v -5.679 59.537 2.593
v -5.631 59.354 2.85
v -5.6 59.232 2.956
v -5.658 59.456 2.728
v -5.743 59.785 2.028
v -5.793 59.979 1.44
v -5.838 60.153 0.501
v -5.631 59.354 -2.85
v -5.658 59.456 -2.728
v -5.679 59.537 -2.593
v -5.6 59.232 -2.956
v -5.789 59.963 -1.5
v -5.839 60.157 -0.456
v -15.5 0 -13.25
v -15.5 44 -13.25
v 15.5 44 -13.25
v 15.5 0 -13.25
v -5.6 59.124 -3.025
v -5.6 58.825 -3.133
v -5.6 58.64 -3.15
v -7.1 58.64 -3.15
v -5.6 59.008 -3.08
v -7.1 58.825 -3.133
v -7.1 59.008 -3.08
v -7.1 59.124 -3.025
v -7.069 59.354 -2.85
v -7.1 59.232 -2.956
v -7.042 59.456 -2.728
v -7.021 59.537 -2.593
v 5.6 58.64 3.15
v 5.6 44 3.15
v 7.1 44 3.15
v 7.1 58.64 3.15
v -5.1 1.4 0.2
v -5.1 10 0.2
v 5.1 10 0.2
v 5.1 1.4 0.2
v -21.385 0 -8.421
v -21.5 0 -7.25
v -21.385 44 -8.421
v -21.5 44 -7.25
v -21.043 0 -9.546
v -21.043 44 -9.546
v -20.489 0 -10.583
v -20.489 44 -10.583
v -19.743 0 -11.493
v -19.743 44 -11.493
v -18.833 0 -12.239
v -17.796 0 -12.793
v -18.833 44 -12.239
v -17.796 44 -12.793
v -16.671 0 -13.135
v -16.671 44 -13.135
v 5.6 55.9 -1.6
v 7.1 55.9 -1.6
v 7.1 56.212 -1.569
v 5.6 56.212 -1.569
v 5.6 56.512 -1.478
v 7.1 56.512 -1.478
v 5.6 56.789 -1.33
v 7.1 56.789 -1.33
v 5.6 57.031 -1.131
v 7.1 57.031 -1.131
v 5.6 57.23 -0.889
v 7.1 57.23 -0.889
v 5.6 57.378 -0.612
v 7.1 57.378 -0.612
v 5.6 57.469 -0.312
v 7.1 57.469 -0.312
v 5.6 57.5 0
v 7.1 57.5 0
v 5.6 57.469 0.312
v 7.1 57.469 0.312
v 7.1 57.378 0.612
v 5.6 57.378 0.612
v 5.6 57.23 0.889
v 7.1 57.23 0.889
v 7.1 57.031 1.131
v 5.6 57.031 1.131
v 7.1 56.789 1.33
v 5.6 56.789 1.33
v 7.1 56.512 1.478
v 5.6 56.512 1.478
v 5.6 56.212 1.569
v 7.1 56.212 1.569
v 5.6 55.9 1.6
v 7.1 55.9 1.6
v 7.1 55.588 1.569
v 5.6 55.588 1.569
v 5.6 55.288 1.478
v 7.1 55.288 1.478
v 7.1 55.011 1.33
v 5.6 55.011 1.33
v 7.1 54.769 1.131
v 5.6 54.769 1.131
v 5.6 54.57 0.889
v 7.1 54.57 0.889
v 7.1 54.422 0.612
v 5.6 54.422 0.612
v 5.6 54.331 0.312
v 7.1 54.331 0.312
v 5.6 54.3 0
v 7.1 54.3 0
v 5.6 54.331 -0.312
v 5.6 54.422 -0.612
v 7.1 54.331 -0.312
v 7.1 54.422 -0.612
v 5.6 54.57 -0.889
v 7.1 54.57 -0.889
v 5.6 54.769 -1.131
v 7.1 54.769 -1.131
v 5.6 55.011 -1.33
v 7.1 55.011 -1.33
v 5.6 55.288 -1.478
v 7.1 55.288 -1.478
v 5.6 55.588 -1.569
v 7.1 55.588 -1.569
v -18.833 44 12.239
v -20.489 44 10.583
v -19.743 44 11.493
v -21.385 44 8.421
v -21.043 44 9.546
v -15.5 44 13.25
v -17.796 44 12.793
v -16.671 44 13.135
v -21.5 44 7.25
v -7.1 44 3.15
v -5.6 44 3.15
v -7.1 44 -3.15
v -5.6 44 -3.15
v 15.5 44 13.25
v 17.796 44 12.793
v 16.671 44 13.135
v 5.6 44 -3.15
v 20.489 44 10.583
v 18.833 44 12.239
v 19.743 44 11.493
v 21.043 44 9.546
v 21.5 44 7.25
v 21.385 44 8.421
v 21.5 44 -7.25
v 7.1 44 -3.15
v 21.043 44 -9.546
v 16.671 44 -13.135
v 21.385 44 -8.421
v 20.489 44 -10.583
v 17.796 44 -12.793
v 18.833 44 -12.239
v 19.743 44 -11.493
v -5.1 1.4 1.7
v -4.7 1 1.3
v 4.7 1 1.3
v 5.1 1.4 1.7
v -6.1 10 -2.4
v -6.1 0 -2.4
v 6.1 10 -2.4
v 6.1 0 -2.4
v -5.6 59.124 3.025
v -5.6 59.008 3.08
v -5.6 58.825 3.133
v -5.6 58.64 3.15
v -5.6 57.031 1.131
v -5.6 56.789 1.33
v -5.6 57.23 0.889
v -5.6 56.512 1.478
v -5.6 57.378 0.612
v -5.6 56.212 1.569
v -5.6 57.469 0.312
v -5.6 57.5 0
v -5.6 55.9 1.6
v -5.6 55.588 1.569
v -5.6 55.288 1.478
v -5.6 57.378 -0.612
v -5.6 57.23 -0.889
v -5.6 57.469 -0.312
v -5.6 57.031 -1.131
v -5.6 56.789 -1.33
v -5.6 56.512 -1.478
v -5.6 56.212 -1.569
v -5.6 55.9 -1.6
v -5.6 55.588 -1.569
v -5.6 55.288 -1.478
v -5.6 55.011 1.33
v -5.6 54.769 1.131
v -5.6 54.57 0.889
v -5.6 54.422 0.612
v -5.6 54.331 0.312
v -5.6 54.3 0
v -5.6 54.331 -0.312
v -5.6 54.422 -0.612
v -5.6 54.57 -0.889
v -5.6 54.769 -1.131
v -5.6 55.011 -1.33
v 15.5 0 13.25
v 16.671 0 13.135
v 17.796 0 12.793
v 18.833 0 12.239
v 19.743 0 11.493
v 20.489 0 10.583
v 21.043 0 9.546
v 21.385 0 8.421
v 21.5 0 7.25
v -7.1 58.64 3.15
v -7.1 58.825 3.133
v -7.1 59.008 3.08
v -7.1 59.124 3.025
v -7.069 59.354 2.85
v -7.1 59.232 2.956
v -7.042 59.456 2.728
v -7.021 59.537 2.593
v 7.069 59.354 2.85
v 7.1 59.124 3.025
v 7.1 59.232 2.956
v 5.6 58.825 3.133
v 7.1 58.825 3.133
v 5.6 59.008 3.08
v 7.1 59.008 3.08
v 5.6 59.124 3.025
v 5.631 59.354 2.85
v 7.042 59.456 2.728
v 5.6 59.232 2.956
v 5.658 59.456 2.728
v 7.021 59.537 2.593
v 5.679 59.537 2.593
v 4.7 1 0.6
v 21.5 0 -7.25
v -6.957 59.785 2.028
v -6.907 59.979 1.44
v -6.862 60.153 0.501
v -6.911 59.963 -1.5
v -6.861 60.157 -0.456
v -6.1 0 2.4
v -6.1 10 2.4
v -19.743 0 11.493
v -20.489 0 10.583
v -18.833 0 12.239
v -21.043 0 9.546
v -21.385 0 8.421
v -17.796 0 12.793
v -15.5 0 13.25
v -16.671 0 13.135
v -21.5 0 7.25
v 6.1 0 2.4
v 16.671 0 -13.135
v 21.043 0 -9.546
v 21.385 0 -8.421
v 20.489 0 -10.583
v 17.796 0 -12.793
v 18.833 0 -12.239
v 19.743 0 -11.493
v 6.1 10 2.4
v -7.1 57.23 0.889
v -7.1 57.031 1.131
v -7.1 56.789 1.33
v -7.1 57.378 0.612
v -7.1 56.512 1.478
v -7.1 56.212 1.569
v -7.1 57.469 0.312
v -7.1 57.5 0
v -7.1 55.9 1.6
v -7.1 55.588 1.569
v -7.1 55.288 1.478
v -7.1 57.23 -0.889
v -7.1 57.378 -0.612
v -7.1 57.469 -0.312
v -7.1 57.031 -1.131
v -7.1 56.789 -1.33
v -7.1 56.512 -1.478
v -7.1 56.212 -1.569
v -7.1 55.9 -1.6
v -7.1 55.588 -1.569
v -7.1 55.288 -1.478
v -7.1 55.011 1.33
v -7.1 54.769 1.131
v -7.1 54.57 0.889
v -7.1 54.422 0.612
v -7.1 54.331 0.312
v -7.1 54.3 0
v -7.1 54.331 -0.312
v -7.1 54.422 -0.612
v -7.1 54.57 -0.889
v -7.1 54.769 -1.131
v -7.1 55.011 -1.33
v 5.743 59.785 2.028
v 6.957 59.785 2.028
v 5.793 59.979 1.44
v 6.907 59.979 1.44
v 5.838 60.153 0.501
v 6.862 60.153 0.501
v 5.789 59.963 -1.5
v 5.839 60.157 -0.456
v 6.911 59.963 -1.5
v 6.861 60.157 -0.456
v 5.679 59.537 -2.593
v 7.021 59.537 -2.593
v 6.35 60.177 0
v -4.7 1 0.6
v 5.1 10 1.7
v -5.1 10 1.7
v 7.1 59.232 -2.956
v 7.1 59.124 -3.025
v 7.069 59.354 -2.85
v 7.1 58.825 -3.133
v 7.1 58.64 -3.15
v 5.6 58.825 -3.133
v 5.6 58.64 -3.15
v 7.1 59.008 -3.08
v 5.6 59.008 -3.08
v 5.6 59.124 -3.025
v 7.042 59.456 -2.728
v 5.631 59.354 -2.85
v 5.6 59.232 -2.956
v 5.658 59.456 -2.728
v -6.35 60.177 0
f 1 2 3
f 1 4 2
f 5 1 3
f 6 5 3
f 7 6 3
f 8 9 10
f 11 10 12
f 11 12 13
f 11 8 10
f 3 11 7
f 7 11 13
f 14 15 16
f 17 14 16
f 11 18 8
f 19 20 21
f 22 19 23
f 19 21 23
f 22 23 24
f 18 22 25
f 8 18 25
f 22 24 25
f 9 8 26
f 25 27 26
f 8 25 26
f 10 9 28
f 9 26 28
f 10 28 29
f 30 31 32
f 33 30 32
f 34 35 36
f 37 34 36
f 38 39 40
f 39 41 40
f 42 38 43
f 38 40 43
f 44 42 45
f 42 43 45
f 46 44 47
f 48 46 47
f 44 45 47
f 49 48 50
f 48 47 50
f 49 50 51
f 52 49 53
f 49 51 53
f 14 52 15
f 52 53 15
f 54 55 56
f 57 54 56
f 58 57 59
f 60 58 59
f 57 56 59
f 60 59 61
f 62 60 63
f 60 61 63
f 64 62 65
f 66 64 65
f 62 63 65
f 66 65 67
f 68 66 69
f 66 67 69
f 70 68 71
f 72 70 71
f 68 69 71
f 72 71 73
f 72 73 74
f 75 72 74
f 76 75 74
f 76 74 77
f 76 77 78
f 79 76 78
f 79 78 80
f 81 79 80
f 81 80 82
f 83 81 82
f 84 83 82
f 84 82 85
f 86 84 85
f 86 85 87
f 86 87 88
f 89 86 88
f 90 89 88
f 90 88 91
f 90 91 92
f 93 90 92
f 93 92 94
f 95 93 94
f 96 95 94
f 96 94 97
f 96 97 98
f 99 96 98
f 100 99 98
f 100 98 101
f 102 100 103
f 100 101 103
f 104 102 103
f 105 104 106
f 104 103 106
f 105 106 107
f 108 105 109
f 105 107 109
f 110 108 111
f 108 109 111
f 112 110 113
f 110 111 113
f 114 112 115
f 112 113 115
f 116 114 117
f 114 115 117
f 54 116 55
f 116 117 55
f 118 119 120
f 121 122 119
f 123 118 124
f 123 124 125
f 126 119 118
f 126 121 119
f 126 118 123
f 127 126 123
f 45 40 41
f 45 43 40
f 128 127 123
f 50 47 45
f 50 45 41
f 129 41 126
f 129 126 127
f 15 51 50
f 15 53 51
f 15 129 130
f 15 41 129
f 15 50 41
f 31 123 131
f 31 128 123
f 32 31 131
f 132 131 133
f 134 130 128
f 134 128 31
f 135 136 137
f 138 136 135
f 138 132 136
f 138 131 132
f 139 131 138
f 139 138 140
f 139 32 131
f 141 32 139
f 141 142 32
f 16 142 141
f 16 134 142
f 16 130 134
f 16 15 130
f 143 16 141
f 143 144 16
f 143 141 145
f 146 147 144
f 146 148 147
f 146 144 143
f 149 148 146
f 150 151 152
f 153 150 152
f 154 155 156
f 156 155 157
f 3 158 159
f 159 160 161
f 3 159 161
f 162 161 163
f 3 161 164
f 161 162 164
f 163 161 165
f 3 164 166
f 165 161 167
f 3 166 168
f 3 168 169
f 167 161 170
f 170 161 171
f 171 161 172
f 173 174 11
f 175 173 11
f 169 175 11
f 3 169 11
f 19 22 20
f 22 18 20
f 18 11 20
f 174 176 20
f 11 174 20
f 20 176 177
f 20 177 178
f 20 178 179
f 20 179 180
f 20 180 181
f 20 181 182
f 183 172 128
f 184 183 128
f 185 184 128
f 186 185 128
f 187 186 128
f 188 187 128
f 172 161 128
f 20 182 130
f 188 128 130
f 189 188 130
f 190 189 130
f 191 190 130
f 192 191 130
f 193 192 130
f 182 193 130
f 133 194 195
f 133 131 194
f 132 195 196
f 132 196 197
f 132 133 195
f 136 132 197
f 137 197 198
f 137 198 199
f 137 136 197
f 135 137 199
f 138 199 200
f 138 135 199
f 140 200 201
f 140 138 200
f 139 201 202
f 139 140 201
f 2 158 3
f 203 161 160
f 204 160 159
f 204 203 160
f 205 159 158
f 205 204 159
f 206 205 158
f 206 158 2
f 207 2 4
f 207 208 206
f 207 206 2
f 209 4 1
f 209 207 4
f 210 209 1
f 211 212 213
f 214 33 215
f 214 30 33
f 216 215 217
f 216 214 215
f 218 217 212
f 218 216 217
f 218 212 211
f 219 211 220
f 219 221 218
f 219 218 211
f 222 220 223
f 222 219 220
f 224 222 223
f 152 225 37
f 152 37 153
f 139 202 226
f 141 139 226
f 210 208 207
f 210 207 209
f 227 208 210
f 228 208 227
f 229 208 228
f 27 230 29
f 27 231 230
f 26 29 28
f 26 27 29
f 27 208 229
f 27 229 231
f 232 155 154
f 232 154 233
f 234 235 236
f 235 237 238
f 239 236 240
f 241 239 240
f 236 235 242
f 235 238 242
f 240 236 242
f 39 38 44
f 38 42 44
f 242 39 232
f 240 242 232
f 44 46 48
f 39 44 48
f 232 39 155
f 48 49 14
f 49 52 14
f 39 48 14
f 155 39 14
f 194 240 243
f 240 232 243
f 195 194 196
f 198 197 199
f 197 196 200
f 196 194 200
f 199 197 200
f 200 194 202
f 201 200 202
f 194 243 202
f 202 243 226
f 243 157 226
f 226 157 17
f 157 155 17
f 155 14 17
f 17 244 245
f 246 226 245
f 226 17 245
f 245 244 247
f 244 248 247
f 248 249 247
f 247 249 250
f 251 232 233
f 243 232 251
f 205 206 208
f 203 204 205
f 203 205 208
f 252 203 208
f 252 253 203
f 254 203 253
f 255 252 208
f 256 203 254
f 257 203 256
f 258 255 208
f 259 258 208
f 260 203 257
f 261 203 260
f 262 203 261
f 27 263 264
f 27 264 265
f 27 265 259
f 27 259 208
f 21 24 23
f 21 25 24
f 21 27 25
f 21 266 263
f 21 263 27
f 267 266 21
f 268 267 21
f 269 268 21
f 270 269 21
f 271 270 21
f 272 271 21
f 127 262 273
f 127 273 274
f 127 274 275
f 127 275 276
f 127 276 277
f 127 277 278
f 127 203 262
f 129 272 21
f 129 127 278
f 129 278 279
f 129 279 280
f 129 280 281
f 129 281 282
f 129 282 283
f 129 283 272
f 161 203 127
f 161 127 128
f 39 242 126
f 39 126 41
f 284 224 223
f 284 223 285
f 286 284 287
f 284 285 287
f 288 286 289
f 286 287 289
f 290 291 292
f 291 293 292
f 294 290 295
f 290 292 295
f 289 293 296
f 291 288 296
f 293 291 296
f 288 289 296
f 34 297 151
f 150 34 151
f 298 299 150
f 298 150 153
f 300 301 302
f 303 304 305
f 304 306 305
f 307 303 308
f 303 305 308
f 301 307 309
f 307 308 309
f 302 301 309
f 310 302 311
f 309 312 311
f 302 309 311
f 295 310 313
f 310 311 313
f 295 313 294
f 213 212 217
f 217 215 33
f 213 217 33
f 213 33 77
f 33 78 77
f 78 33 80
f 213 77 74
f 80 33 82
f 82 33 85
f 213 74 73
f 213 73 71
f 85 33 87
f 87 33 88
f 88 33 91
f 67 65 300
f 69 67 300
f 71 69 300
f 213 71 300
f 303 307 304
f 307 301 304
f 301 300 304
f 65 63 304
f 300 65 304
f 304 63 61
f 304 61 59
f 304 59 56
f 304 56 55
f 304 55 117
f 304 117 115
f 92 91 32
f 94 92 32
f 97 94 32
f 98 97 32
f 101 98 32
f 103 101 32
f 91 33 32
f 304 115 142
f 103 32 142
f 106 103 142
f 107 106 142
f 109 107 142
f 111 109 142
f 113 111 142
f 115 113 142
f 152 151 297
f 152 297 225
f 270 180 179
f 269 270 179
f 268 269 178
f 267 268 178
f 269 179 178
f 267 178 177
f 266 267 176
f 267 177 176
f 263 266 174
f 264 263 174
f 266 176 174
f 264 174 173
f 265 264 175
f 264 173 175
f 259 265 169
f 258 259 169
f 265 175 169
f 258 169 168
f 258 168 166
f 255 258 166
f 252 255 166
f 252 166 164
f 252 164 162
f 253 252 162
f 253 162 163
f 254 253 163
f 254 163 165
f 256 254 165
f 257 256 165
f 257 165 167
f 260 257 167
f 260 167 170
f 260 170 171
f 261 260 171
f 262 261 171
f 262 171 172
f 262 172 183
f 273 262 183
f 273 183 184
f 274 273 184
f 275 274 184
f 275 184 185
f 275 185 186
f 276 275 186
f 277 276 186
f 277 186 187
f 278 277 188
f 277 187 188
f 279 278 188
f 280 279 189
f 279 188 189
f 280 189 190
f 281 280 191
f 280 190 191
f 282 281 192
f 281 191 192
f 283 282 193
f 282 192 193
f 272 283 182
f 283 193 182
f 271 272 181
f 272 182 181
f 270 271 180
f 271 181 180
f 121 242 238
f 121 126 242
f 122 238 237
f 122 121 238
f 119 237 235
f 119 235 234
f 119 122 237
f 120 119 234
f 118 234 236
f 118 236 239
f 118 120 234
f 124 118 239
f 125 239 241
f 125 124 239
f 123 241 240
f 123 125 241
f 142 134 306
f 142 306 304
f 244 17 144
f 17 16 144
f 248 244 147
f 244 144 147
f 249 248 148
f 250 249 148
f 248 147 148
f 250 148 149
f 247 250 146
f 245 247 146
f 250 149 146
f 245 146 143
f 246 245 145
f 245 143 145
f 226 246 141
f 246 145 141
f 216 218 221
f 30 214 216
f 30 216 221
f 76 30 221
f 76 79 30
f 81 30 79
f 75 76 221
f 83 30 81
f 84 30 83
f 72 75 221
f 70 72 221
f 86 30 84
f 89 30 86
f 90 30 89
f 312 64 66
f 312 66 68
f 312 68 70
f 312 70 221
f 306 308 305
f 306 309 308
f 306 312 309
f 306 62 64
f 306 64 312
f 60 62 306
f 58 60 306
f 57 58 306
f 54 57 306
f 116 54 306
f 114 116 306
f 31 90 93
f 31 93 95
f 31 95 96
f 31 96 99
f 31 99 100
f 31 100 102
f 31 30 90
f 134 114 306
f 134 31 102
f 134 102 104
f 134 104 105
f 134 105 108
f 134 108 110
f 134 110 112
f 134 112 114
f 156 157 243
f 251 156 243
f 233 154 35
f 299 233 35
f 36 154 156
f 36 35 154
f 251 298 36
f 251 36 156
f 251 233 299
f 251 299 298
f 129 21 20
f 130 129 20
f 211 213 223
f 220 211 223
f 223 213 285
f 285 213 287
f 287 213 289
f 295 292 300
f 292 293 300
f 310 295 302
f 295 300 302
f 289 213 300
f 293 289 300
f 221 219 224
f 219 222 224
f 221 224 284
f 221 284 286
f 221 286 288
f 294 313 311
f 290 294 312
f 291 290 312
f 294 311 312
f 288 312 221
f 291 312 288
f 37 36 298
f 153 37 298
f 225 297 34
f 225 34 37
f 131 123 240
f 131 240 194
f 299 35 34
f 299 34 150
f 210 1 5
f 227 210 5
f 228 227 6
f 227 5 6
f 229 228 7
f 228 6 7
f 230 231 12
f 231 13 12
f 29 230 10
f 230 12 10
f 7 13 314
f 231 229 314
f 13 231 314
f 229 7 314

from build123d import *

# Parameters (mm, degrees)
SKETCH2_W           = 43
SKETCH2_H           = 26.5
BOSS_EXTRUDE1_DEPTH = 44
SKETCH3_W           = 12.2
SKETCH3_H           = 4.8
CUT_EXTRUDE1_DEPTH  = 10
SKETCH4_W           = 1.5
SKETCH4_H           = 6.3
BOSS_EXTRUDE2_DEPTH = 16.2
SKETCH5_R           = 1.6
CUT_EXTRUDE2_DEPTH  = 16.2
CUT_EXTRUDE3_DEPTH  = 16.2
CUT_EXTRUDE4_DEPTH  = 16.2
FILLET1_R           = 1
FILLET2_R           = 6
SKETCH8_W           = 10.2
SKETCH8_H           = 1.5
BOSS_EXTRUDE3_DEPTH = 9
CHAMFER1_SIZE       = 0.4


with BuildPart() as part:
    # Sketch2 → Boss-Extrude1 (new body)
    with BuildSketch(Plane(origin=(0, 0, 0), x_dir=(1, 0, 0), z_dir=(0, 1, 0))):
        Rectangle(SKETCH2_W, SKETCH2_H)
    extrude(amount=BOSS_EXTRUDE1_DEPTH)

    # Sketch3 → Cut-Extrude1 (cut)
    with BuildSketch(Plane.XZ):
        Rectangle(SKETCH3_W, SKETCH3_H)
    extrude(amount=-CUT_EXTRUDE1_DEPTH, mode=Mode.SUBTRACT)

    # Sketch4 → Boss-Extrude2 (add)
    with BuildSketch(Plane(origin=(0, 44, 0), x_dir=(1, 0, 0), z_dir=(0, 1, 0))):
        with Locations((-6.35, 0)):
            Rectangle(SKETCH4_W, SKETCH4_H)
        with Locations((6.35, 0)):
            Rectangle(SKETCH4_W, SKETCH4_H)
    extrude(amount=BOSS_EXTRUDE2_DEPTH)

    # Sketch5 → Cut-Extrude2 (cut)
    with BuildSketch(Plane(origin=(7.1, 0, 0), x_dir=(0, 0, -1), z_dir=(1, 0, 0))):
        with Locations((0, 55.9)):
            Circle(SKETCH5_R)
    extrude(amount=-CUT_EXTRUDE2_DEPTH, mode=Mode.SUBTRACT)

    # Sketch6 → Cut-Extrude3 (cut)
    with BuildSketch(Plane(origin=(0, 0, -3.15), x_dir=(-1, 0, 0), z_dir=(0, 0, -1))):
        Polygon((-6.85, 60.2), (-5.85, 60.2), (-5.6, 59.231754163), (-5.6, 60.384988015), (-7.1, 60.384988015), (-7.1, 59.231754163), align=None)
    cut_extrude3 = extrude(amount=-CUT_EXTRUDE3_DEPTH, mode=Mode.SUBTRACT)

    # Mirror1: Cut-Extrude3 across plane
    add(cut_extrude3.mirror(Plane(origin=(0, 0, 0), x_dir=(0, 0, 1), z_dir=(1, 0, 0))), mode=Mode.SUBTRACT)

    # Sketch7 → Cut-Extrude4 (cut)
    with BuildSketch(Plane(origin=(7.1, 0, 0), x_dir=(0, 0, -1), z_dir=(1, 0, 0))):
        with BuildLine():
            Line((-3.15, 59.231754163), (-3.15, 61.207063701))
            Line((-3.15, 61.207063701), (3.15, 61.207063701))
            Line((3.15, 61.207063701), (3.15, 59.231754163))
            add(Edge.make_bspline(
                [(-3.15, 59.231754163), (0, 61.121756778), (3.15, 59.231754163)],
                knots=[0, 0, 0, 1, 1, 1], degree=2))
        make_face()
    extrude(amount=-CUT_EXTRUDE4_DEPTH, mode=Mode.SUBTRACT)

    # Fillet1
    fillet1_edges = [part.edges().sort_by_distance(p)[0] for p in [
        (6.35, 59.231754163, -3.15),
        (-6.35, 59.231754163, -3.15),
        (-6.35, 59.231754163, 3.15),
        (6.35, 59.231754163, 3.15),
    ]]
    fillet(fillet1_edges, radius=FILLET1_R)

    # Fillet2
    fillet2_edges = [part.edges().sort_by_distance(p)[0] for p in [
        (21.5, 22, 13.25),
        (-21.5, 22, 13.25),
        (-21.5, 22, -13.25),
        (21.5, 22, -13.25),
    ]]
    fillet(fillet2_edges, radius=FILLET2_R)

    # Sketch8 → Boss-Extrude3 (add)
    with BuildSketch(Plane.XZ.offset(-10)):
        with Locations((0, 0.95)):
            Rectangle(SKETCH8_W, SKETCH8_H)
    extrude(amount=BOSS_EXTRUDE3_DEPTH)

    # Chamfer1
    chamfer1_edges = [part.edges().sort_by_distance(p)[0] for p in [
        (0, 1, 1.7),
        (-5.1, 1, 0.95),
        (0, 1, 0.2),
        (5.1, 1, 0.95),
    ]]
    chamfer(chamfer1_edges, length=CHAMFER1_SIZE)


solid = part.part
